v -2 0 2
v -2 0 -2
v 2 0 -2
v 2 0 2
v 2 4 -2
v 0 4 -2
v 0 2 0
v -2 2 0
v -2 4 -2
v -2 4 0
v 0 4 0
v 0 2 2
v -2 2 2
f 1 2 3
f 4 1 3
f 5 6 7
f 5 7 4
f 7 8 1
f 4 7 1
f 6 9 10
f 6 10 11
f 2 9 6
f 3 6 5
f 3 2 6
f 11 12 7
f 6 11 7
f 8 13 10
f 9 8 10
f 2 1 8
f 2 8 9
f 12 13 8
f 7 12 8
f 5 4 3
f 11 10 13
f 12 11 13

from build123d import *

# Parameters (mm, degrees)
SKETCH1_W           = 4
SKETCH1_H           = 4
BOSS_EXTRUDE1_DEPTH = 4
CUT_EXTRUDE1_DEPTH  = 10
CUT_EXTRUDE2_DEPTH  = 2


with BuildPart() as part:
    # Sketch1 → Boss-Extrude1 (new body)
    with BuildSketch(Plane(origin=(0, 0, 0), x_dir=(1, 0, 0), z_dir=(0, 1, 0))):
        Rectangle(SKETCH1_W, SKETCH1_H)
    extrude(amount=BOSS_EXTRUDE1_DEPTH)

    # Sketch2 → Cut-Extrude1 (cut)
    with BuildSketch(Plane.ZY.offset(2)):
        Polygon((0, 2), (2, 0), (2, 2), align=None)
        Polygon((0, 4), (2, 2), (2, 4), align=None)
    extrude(amount=-CUT_EXTRUDE1_DEPTH, mode=Mode.SUBTRACT)

    # Sketch3 → Cut-Extrude2 (cut)
    with BuildSketch(Plane(origin=(2, 0, 0), x_dir=(0, 0, -1), z_dir=(1, 0, 0))):
        Polygon((-2, 0), (2, 4), (-2, 4.116557223), align=None)
    extrude(amount=-CUT_EXTRUDE2_DEPTH, mode=Mode.SUBTRACT)


solid = part.part
